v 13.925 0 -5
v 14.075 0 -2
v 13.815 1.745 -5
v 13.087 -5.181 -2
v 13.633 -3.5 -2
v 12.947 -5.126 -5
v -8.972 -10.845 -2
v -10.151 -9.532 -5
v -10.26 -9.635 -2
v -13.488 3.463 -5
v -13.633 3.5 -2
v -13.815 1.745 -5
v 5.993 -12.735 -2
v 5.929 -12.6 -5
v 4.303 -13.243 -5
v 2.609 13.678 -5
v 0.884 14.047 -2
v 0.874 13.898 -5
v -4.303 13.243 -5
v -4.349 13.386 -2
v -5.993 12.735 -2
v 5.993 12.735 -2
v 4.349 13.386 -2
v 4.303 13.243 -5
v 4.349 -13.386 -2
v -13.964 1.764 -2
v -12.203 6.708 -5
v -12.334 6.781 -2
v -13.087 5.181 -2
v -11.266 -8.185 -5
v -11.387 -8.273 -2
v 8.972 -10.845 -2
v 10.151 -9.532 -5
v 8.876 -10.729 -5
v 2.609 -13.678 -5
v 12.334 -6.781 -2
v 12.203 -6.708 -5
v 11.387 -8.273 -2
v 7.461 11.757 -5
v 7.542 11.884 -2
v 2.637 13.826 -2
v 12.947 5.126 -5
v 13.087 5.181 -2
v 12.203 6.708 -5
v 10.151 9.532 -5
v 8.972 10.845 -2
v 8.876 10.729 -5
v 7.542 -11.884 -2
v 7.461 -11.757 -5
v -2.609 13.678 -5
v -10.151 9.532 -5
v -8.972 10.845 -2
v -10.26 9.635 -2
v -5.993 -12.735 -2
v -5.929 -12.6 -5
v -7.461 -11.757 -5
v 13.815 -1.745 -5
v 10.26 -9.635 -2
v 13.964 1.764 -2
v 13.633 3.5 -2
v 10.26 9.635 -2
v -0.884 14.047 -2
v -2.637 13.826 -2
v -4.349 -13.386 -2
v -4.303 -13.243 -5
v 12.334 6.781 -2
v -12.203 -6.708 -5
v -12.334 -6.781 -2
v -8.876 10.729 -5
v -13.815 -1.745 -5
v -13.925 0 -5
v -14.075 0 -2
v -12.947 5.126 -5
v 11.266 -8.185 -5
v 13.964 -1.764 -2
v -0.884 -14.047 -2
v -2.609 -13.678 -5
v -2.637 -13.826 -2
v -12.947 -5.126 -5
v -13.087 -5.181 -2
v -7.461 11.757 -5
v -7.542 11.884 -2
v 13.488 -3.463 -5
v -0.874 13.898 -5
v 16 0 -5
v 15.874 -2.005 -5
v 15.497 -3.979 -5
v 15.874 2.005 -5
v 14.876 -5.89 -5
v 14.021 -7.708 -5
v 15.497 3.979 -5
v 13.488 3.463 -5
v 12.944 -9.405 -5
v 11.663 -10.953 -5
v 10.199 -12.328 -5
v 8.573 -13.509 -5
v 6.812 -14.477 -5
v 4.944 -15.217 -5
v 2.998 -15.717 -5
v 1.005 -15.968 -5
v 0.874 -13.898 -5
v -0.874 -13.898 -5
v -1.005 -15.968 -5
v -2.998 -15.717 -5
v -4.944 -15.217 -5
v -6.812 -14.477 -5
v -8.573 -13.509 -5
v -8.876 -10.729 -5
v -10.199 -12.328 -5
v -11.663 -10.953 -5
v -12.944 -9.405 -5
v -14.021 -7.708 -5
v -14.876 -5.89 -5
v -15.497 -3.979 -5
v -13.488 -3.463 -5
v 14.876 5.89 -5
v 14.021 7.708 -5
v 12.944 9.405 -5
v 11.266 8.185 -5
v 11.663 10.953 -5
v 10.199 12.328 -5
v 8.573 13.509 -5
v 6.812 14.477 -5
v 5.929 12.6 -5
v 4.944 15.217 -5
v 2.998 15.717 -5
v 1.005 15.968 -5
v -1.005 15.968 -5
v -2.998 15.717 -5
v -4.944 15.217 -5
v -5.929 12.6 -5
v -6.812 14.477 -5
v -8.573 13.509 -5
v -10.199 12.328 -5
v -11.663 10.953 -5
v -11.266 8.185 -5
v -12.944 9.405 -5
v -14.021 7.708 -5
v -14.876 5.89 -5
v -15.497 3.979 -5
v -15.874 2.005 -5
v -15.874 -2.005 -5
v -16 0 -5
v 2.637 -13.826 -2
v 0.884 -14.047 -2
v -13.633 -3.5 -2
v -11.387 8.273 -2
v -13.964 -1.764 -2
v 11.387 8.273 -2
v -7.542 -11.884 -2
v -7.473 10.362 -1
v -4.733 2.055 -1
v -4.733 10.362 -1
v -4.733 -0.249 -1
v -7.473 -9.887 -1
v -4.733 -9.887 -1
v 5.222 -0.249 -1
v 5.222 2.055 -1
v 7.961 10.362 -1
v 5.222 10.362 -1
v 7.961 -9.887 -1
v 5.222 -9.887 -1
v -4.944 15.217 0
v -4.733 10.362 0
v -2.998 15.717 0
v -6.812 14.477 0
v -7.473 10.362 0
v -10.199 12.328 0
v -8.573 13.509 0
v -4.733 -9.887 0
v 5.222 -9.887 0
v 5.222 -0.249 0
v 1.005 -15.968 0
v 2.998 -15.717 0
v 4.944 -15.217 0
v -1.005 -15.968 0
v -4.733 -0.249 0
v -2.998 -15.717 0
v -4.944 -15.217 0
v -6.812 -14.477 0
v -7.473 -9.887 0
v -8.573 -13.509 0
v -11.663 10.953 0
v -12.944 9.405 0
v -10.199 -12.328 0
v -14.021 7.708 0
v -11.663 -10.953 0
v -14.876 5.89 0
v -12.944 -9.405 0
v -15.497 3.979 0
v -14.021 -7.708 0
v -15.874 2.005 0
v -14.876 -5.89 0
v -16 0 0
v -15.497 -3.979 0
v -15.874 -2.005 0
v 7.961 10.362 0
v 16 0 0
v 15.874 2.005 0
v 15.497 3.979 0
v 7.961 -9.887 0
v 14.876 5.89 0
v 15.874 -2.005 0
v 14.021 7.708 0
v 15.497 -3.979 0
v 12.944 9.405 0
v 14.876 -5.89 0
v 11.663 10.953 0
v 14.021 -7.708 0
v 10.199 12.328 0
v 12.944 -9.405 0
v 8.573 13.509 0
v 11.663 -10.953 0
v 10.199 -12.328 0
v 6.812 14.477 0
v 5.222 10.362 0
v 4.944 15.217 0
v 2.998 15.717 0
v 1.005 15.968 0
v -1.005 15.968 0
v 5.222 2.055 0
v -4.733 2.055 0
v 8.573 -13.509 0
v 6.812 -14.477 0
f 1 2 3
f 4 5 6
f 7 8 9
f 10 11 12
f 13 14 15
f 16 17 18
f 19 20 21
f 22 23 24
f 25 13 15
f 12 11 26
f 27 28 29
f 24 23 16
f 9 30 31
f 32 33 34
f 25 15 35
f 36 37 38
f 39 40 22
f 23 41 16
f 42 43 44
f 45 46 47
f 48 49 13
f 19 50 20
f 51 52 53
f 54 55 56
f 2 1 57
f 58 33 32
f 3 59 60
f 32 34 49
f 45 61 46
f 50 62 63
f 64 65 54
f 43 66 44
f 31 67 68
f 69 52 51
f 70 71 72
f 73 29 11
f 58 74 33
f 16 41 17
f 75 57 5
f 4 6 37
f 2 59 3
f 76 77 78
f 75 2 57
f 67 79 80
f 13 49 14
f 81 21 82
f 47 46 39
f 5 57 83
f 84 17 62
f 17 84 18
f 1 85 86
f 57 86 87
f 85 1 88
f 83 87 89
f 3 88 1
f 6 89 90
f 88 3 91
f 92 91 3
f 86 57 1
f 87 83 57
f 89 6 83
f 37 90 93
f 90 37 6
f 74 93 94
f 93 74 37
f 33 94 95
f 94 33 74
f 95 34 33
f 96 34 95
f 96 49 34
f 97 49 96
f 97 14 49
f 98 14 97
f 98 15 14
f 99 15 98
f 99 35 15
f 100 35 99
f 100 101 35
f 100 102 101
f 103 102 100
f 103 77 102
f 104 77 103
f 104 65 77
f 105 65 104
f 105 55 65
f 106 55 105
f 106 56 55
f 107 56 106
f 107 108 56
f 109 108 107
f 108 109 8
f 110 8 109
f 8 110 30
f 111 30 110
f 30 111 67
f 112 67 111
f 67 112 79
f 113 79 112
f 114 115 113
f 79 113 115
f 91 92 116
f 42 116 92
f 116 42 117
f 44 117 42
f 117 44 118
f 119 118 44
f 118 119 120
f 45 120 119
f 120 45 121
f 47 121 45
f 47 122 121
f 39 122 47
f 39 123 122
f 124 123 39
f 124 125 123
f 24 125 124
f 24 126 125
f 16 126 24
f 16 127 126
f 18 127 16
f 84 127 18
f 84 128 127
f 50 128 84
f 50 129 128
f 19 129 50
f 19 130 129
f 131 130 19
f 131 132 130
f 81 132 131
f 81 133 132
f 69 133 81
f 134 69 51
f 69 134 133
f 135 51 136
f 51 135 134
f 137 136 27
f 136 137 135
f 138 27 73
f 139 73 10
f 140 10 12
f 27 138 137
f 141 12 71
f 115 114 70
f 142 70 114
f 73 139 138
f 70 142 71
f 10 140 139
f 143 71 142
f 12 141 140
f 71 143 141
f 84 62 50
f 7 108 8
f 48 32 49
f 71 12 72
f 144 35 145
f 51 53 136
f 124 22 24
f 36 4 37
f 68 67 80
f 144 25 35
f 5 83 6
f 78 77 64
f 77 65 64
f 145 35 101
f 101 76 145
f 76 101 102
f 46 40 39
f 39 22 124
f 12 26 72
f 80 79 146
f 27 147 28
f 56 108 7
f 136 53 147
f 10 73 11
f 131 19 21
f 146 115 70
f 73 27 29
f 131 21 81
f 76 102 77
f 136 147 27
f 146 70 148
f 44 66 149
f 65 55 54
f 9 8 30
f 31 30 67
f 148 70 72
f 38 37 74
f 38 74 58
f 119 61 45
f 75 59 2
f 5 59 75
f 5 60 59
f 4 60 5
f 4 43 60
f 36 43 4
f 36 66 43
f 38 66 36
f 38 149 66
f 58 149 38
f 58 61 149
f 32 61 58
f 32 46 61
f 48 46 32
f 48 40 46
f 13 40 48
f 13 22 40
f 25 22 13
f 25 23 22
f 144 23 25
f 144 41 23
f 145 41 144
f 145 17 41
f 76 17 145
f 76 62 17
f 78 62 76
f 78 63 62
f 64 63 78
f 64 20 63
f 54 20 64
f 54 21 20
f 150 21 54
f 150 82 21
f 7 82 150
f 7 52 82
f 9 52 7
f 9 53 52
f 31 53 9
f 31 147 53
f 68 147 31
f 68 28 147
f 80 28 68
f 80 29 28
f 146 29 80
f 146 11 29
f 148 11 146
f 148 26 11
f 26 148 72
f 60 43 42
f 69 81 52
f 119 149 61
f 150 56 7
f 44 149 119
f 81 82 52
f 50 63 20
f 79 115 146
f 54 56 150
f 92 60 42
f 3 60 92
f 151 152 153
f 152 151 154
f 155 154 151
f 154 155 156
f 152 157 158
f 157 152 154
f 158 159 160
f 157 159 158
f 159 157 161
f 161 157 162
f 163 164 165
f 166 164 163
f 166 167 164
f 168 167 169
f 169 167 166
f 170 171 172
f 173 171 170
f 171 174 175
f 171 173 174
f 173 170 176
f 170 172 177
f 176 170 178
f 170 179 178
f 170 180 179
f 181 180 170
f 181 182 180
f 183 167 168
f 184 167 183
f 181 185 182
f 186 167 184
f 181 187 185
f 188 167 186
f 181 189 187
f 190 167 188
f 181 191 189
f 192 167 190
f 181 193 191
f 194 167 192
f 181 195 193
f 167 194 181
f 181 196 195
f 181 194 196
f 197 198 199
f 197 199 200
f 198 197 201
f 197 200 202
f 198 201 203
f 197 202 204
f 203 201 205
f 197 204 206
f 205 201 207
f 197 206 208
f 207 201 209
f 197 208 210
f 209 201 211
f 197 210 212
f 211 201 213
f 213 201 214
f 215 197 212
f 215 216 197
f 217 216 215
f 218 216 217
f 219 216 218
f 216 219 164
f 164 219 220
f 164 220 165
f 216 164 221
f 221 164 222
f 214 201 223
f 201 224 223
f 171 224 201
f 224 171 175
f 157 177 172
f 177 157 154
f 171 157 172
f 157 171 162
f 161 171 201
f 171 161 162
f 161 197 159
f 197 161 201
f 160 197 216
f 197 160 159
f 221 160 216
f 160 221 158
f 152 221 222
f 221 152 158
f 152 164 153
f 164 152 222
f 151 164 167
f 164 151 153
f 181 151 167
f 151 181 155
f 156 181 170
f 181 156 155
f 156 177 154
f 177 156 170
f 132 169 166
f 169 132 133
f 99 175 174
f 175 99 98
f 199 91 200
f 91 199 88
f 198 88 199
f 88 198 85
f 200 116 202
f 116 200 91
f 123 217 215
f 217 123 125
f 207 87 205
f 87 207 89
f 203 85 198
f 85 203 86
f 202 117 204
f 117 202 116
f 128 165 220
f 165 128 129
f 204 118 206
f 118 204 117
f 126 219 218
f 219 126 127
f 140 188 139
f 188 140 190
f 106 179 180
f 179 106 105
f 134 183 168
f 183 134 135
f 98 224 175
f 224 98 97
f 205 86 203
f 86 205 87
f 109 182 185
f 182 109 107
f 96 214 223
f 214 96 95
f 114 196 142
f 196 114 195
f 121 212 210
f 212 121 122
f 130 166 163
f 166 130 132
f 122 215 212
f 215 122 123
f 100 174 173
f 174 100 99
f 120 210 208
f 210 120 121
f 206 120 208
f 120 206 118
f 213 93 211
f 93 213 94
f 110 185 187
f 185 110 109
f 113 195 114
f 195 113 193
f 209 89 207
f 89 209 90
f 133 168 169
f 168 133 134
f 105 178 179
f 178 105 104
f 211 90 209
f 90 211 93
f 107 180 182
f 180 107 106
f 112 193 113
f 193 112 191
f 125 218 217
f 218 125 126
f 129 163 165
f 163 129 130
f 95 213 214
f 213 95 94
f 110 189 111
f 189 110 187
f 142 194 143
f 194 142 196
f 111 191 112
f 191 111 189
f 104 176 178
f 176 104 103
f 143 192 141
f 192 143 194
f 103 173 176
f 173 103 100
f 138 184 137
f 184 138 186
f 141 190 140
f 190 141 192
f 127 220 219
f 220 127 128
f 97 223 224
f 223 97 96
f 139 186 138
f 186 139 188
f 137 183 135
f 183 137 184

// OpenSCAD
$fn = 50;


difference() {
	union() {
		translate(v = [0, 0, -5.0000000000]) {
			cylinder(h = 5, r = 16.0000000000);
		}
	}
	union() {
		#translate(v = [0, 0, -5.0000000000]) {
			cylinder(h = 3, r1 = 13.9250000000, r2 = 14.0750000000);
		}
		translate(v = [0, 0, -1]) {
			linear_extrude(height = 1) {
				text(font = "Impact", halign = "center", size = 20, text = "H", valign = "center");
			}
		}
	}
}
